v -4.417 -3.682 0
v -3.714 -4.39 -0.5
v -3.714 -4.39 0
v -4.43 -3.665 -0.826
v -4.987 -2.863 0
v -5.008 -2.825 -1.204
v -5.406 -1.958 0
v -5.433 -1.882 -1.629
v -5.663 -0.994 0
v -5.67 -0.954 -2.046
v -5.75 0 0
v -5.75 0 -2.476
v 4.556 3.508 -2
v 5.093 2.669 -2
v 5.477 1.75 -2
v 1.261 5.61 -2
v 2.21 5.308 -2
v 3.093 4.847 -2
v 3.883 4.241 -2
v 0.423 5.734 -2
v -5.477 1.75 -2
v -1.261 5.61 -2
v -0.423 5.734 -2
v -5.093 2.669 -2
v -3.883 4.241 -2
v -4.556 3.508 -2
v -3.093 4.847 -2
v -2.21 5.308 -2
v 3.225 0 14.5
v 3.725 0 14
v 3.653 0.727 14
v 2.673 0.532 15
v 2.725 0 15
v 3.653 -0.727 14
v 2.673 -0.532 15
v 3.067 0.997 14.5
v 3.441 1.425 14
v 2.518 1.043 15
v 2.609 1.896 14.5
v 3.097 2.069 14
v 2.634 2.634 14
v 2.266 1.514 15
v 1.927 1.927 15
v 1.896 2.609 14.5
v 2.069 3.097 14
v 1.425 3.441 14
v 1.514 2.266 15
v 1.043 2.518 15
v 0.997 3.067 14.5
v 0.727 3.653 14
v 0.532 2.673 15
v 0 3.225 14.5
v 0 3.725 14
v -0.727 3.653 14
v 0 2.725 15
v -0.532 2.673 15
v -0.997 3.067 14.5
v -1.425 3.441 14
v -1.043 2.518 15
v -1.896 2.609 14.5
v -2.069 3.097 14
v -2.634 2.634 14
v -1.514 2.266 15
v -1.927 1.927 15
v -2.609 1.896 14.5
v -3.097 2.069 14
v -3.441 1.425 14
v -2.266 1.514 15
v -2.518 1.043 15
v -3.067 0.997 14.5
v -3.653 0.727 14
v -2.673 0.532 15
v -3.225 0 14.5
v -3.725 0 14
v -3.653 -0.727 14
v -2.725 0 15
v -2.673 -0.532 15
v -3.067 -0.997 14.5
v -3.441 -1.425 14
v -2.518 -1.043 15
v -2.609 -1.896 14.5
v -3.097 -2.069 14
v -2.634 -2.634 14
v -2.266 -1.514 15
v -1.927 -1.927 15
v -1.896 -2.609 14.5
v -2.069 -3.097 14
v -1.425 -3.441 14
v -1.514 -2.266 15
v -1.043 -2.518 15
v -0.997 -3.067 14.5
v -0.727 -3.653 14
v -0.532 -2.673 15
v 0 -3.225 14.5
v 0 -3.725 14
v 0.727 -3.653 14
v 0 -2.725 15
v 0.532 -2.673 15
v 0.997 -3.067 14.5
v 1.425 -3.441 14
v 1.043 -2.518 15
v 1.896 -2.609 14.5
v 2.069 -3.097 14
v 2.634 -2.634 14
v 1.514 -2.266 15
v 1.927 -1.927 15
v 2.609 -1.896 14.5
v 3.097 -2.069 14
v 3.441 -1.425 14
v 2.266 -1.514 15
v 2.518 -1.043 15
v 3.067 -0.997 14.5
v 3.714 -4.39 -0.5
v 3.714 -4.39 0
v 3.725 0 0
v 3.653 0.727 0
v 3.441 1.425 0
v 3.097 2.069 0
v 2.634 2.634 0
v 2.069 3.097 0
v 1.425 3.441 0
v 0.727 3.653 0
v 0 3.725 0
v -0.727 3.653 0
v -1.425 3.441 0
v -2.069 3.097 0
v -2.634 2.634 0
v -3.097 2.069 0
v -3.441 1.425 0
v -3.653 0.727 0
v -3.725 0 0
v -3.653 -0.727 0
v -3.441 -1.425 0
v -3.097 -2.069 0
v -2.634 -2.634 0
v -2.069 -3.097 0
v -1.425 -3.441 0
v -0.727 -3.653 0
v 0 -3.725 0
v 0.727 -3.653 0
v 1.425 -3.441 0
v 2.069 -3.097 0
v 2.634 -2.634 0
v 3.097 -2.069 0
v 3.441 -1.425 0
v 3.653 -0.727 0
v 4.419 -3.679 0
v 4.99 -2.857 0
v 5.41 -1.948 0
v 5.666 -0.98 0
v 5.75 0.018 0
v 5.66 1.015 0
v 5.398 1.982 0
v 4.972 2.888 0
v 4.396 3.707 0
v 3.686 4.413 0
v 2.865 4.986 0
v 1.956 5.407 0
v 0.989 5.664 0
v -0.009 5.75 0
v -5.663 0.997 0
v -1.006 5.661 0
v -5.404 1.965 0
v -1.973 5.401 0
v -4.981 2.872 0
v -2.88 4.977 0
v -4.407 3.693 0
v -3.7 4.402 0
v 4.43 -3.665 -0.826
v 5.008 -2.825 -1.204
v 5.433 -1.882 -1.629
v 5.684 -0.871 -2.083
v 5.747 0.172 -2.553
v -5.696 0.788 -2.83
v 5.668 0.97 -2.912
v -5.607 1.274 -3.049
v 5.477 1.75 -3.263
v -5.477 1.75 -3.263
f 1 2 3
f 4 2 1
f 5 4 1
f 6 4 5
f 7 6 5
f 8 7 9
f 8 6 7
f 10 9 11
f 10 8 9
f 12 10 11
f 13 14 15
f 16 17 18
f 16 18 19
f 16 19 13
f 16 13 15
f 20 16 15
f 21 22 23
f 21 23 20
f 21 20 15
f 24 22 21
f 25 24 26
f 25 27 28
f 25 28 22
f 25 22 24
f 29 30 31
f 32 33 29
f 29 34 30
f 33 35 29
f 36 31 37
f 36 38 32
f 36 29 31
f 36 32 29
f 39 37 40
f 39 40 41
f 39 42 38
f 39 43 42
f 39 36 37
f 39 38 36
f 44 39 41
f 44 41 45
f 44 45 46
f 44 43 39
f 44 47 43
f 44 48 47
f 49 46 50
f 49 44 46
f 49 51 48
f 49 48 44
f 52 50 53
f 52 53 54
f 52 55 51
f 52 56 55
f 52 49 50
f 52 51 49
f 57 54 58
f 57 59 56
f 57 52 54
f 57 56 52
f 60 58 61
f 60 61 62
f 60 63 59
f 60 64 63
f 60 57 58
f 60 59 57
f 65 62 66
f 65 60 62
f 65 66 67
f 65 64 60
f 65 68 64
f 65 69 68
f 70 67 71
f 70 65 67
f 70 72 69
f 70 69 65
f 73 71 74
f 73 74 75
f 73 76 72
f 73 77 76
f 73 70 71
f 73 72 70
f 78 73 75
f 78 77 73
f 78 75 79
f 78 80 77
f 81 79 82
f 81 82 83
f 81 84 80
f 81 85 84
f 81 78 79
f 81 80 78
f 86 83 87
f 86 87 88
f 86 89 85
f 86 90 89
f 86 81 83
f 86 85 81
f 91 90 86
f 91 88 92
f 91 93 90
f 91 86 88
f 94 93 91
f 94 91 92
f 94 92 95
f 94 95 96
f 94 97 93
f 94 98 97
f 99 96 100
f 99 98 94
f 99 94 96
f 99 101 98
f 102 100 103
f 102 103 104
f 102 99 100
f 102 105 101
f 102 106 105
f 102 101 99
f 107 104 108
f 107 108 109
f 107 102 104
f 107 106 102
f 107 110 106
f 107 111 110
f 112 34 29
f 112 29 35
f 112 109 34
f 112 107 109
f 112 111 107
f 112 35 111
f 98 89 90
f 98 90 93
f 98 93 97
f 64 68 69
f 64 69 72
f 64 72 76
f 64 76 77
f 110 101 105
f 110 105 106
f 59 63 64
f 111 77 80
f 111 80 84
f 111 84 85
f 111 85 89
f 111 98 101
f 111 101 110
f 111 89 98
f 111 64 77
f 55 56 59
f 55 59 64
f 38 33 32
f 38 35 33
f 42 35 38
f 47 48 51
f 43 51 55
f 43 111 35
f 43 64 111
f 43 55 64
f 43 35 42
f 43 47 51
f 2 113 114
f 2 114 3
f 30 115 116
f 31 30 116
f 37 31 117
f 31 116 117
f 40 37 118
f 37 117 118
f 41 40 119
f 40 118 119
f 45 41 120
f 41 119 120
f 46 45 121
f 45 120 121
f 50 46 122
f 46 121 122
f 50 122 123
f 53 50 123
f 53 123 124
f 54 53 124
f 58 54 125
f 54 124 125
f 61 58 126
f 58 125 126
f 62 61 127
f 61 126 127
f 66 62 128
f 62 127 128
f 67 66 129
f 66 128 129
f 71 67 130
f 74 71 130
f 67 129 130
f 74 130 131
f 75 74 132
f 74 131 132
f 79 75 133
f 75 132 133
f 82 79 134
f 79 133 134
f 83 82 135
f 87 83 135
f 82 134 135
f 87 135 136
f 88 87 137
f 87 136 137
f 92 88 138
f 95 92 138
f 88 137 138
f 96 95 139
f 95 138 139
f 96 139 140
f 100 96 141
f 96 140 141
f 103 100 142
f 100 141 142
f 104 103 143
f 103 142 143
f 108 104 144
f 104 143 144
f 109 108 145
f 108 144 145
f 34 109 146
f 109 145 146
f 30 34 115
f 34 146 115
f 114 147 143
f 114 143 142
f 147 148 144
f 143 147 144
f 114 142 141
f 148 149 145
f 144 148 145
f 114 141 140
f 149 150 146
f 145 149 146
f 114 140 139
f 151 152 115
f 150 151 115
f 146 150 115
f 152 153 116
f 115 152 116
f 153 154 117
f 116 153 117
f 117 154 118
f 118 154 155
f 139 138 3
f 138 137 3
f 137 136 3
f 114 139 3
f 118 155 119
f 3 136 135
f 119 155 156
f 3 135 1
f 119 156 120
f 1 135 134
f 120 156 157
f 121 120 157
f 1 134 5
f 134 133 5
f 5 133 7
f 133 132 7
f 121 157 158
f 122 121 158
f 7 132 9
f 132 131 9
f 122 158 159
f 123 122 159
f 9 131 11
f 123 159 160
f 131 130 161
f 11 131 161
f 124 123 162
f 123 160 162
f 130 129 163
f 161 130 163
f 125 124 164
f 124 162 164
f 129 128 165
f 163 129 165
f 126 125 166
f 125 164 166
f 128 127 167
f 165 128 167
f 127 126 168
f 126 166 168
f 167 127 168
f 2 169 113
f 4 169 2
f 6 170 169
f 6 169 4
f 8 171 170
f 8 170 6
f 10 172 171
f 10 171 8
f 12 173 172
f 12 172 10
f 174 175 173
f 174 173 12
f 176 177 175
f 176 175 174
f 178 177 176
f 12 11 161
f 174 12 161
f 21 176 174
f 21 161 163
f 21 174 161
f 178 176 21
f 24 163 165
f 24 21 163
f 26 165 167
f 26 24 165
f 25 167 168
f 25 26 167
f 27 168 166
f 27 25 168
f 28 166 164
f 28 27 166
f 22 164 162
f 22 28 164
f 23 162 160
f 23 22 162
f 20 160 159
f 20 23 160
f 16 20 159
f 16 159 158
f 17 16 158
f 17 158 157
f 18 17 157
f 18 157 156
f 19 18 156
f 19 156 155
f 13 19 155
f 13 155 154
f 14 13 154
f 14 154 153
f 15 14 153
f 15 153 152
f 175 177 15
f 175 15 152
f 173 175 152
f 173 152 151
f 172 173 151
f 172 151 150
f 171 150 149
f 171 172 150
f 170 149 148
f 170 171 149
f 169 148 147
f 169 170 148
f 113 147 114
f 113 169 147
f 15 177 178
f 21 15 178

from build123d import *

# Parameters (mm, degrees)
SKETCH_1_R          = 3.725
EXTRUDE_1_DEPTH     = 15
EXTRUDE_START       = 5
SKETCH_2_R          = 3.725
EXTRUDE_2_DEPTH     = 5
CHAMFER_2_SIZE      = 1
CHAMFER_3_SIZE      = 4.5
CHAMFER_3_SIZE2     = 10
CUT_EXTRUDE_1_DEPTH = 3


with BuildPart() as part:
    # 스케치1 → 보스-돌출1 (new body)
    with BuildSketch(Plane.XY):
        Circle(SKETCH_1_R)
    extrude(amount=EXTRUDE_1_DEPTH)

    # 스케치2 → 보스-돌출2 (add)
    # profile 1 of 2: a face of its own
    with BuildSketch(Plane(origin=(0, 0, 0), x_dir=(-1, 0, 0), z_dir=(0, 0, -1)).offset(EXTRUDE_START)):
        with BuildLine():
            ThreePointArc((5.75, 0), (-2.419672395, 5.216098686), (-3.713542783, -4.39))
            Line((-3.713542783, -4.39), (3.713542783, -4.39))
            ThreePointArc((3.713542783, -4.39), (5.216098686, -2.419672395), (5.75, 0))
        make_face()
        Circle(SKETCH_2_R, mode=Mode.SUBTRACT)
    # profile 2 of 2: a face of its own
    with BuildSketch(Plane(origin=(0, 0, 0), x_dir=(-1, 0, 0), z_dir=(0, 0, -1)).offset(EXTRUDE_START)):
        Circle(SKETCH_2_R)
    extrude(amount=-EXTRUDE_2_DEPTH)

    # 모따기2
    chamfer_2_edges = [part.edges().sort_by_distance(p)[0] for p in [
        (-3.725, 0, 15),
    ]]
    chamfer(chamfer_2_edges, length=CHAMFER_2_SIZE)

    # 모따기3
    chamfer_3_edges = [part.edges().sort_by_distance(p)[0] for p in [
        (0, -4.39, -5),
    ]]
    chamfer_3_side = [part.faces().sort_by_distance(p)[0] for p in [
        (0, -4.39, -2.5),
    ]]
    chamfer(chamfer_3_edges, length=CHAMFER_3_SIZE, length2=CHAMFER_3_SIZE2, reference=chamfer_3_side[0])

    # 스케치3 → 컷-돌출1 (cut)
    with BuildSketch(Plane(origin=(0, 0, -5), x_dir=(-1, 0, 0), z_dir=(0, 0, -1))):
        with BuildLine():
            ThreePointArc((-1.261110622, 5.61), (-3.882807448, 4.241026565), (-5.477225575, 1.75))
            Line((-5.477225575, 1.75), (5.477225575, 1.75))
            ThreePointArc((5.477225575, 1.75), (3.882807448, 4.241026565), (1.261110622, 5.61))
            Line((1.261110622, 5.61), (-1.261110622, 5.61))
        make_face()
        with BuildLine():
            Line((-1.261110622, 5.61), (1.261110622, 5.61))
            ThreePointArc((1.261110622, 5.61), (0, 5.75), (-1.261110622, 5.61))
        make_face()
    extrude(amount=-CUT_EXTRUDE_1_DEPTH, mode=Mode.SUBTRACT)


solid = part.part
